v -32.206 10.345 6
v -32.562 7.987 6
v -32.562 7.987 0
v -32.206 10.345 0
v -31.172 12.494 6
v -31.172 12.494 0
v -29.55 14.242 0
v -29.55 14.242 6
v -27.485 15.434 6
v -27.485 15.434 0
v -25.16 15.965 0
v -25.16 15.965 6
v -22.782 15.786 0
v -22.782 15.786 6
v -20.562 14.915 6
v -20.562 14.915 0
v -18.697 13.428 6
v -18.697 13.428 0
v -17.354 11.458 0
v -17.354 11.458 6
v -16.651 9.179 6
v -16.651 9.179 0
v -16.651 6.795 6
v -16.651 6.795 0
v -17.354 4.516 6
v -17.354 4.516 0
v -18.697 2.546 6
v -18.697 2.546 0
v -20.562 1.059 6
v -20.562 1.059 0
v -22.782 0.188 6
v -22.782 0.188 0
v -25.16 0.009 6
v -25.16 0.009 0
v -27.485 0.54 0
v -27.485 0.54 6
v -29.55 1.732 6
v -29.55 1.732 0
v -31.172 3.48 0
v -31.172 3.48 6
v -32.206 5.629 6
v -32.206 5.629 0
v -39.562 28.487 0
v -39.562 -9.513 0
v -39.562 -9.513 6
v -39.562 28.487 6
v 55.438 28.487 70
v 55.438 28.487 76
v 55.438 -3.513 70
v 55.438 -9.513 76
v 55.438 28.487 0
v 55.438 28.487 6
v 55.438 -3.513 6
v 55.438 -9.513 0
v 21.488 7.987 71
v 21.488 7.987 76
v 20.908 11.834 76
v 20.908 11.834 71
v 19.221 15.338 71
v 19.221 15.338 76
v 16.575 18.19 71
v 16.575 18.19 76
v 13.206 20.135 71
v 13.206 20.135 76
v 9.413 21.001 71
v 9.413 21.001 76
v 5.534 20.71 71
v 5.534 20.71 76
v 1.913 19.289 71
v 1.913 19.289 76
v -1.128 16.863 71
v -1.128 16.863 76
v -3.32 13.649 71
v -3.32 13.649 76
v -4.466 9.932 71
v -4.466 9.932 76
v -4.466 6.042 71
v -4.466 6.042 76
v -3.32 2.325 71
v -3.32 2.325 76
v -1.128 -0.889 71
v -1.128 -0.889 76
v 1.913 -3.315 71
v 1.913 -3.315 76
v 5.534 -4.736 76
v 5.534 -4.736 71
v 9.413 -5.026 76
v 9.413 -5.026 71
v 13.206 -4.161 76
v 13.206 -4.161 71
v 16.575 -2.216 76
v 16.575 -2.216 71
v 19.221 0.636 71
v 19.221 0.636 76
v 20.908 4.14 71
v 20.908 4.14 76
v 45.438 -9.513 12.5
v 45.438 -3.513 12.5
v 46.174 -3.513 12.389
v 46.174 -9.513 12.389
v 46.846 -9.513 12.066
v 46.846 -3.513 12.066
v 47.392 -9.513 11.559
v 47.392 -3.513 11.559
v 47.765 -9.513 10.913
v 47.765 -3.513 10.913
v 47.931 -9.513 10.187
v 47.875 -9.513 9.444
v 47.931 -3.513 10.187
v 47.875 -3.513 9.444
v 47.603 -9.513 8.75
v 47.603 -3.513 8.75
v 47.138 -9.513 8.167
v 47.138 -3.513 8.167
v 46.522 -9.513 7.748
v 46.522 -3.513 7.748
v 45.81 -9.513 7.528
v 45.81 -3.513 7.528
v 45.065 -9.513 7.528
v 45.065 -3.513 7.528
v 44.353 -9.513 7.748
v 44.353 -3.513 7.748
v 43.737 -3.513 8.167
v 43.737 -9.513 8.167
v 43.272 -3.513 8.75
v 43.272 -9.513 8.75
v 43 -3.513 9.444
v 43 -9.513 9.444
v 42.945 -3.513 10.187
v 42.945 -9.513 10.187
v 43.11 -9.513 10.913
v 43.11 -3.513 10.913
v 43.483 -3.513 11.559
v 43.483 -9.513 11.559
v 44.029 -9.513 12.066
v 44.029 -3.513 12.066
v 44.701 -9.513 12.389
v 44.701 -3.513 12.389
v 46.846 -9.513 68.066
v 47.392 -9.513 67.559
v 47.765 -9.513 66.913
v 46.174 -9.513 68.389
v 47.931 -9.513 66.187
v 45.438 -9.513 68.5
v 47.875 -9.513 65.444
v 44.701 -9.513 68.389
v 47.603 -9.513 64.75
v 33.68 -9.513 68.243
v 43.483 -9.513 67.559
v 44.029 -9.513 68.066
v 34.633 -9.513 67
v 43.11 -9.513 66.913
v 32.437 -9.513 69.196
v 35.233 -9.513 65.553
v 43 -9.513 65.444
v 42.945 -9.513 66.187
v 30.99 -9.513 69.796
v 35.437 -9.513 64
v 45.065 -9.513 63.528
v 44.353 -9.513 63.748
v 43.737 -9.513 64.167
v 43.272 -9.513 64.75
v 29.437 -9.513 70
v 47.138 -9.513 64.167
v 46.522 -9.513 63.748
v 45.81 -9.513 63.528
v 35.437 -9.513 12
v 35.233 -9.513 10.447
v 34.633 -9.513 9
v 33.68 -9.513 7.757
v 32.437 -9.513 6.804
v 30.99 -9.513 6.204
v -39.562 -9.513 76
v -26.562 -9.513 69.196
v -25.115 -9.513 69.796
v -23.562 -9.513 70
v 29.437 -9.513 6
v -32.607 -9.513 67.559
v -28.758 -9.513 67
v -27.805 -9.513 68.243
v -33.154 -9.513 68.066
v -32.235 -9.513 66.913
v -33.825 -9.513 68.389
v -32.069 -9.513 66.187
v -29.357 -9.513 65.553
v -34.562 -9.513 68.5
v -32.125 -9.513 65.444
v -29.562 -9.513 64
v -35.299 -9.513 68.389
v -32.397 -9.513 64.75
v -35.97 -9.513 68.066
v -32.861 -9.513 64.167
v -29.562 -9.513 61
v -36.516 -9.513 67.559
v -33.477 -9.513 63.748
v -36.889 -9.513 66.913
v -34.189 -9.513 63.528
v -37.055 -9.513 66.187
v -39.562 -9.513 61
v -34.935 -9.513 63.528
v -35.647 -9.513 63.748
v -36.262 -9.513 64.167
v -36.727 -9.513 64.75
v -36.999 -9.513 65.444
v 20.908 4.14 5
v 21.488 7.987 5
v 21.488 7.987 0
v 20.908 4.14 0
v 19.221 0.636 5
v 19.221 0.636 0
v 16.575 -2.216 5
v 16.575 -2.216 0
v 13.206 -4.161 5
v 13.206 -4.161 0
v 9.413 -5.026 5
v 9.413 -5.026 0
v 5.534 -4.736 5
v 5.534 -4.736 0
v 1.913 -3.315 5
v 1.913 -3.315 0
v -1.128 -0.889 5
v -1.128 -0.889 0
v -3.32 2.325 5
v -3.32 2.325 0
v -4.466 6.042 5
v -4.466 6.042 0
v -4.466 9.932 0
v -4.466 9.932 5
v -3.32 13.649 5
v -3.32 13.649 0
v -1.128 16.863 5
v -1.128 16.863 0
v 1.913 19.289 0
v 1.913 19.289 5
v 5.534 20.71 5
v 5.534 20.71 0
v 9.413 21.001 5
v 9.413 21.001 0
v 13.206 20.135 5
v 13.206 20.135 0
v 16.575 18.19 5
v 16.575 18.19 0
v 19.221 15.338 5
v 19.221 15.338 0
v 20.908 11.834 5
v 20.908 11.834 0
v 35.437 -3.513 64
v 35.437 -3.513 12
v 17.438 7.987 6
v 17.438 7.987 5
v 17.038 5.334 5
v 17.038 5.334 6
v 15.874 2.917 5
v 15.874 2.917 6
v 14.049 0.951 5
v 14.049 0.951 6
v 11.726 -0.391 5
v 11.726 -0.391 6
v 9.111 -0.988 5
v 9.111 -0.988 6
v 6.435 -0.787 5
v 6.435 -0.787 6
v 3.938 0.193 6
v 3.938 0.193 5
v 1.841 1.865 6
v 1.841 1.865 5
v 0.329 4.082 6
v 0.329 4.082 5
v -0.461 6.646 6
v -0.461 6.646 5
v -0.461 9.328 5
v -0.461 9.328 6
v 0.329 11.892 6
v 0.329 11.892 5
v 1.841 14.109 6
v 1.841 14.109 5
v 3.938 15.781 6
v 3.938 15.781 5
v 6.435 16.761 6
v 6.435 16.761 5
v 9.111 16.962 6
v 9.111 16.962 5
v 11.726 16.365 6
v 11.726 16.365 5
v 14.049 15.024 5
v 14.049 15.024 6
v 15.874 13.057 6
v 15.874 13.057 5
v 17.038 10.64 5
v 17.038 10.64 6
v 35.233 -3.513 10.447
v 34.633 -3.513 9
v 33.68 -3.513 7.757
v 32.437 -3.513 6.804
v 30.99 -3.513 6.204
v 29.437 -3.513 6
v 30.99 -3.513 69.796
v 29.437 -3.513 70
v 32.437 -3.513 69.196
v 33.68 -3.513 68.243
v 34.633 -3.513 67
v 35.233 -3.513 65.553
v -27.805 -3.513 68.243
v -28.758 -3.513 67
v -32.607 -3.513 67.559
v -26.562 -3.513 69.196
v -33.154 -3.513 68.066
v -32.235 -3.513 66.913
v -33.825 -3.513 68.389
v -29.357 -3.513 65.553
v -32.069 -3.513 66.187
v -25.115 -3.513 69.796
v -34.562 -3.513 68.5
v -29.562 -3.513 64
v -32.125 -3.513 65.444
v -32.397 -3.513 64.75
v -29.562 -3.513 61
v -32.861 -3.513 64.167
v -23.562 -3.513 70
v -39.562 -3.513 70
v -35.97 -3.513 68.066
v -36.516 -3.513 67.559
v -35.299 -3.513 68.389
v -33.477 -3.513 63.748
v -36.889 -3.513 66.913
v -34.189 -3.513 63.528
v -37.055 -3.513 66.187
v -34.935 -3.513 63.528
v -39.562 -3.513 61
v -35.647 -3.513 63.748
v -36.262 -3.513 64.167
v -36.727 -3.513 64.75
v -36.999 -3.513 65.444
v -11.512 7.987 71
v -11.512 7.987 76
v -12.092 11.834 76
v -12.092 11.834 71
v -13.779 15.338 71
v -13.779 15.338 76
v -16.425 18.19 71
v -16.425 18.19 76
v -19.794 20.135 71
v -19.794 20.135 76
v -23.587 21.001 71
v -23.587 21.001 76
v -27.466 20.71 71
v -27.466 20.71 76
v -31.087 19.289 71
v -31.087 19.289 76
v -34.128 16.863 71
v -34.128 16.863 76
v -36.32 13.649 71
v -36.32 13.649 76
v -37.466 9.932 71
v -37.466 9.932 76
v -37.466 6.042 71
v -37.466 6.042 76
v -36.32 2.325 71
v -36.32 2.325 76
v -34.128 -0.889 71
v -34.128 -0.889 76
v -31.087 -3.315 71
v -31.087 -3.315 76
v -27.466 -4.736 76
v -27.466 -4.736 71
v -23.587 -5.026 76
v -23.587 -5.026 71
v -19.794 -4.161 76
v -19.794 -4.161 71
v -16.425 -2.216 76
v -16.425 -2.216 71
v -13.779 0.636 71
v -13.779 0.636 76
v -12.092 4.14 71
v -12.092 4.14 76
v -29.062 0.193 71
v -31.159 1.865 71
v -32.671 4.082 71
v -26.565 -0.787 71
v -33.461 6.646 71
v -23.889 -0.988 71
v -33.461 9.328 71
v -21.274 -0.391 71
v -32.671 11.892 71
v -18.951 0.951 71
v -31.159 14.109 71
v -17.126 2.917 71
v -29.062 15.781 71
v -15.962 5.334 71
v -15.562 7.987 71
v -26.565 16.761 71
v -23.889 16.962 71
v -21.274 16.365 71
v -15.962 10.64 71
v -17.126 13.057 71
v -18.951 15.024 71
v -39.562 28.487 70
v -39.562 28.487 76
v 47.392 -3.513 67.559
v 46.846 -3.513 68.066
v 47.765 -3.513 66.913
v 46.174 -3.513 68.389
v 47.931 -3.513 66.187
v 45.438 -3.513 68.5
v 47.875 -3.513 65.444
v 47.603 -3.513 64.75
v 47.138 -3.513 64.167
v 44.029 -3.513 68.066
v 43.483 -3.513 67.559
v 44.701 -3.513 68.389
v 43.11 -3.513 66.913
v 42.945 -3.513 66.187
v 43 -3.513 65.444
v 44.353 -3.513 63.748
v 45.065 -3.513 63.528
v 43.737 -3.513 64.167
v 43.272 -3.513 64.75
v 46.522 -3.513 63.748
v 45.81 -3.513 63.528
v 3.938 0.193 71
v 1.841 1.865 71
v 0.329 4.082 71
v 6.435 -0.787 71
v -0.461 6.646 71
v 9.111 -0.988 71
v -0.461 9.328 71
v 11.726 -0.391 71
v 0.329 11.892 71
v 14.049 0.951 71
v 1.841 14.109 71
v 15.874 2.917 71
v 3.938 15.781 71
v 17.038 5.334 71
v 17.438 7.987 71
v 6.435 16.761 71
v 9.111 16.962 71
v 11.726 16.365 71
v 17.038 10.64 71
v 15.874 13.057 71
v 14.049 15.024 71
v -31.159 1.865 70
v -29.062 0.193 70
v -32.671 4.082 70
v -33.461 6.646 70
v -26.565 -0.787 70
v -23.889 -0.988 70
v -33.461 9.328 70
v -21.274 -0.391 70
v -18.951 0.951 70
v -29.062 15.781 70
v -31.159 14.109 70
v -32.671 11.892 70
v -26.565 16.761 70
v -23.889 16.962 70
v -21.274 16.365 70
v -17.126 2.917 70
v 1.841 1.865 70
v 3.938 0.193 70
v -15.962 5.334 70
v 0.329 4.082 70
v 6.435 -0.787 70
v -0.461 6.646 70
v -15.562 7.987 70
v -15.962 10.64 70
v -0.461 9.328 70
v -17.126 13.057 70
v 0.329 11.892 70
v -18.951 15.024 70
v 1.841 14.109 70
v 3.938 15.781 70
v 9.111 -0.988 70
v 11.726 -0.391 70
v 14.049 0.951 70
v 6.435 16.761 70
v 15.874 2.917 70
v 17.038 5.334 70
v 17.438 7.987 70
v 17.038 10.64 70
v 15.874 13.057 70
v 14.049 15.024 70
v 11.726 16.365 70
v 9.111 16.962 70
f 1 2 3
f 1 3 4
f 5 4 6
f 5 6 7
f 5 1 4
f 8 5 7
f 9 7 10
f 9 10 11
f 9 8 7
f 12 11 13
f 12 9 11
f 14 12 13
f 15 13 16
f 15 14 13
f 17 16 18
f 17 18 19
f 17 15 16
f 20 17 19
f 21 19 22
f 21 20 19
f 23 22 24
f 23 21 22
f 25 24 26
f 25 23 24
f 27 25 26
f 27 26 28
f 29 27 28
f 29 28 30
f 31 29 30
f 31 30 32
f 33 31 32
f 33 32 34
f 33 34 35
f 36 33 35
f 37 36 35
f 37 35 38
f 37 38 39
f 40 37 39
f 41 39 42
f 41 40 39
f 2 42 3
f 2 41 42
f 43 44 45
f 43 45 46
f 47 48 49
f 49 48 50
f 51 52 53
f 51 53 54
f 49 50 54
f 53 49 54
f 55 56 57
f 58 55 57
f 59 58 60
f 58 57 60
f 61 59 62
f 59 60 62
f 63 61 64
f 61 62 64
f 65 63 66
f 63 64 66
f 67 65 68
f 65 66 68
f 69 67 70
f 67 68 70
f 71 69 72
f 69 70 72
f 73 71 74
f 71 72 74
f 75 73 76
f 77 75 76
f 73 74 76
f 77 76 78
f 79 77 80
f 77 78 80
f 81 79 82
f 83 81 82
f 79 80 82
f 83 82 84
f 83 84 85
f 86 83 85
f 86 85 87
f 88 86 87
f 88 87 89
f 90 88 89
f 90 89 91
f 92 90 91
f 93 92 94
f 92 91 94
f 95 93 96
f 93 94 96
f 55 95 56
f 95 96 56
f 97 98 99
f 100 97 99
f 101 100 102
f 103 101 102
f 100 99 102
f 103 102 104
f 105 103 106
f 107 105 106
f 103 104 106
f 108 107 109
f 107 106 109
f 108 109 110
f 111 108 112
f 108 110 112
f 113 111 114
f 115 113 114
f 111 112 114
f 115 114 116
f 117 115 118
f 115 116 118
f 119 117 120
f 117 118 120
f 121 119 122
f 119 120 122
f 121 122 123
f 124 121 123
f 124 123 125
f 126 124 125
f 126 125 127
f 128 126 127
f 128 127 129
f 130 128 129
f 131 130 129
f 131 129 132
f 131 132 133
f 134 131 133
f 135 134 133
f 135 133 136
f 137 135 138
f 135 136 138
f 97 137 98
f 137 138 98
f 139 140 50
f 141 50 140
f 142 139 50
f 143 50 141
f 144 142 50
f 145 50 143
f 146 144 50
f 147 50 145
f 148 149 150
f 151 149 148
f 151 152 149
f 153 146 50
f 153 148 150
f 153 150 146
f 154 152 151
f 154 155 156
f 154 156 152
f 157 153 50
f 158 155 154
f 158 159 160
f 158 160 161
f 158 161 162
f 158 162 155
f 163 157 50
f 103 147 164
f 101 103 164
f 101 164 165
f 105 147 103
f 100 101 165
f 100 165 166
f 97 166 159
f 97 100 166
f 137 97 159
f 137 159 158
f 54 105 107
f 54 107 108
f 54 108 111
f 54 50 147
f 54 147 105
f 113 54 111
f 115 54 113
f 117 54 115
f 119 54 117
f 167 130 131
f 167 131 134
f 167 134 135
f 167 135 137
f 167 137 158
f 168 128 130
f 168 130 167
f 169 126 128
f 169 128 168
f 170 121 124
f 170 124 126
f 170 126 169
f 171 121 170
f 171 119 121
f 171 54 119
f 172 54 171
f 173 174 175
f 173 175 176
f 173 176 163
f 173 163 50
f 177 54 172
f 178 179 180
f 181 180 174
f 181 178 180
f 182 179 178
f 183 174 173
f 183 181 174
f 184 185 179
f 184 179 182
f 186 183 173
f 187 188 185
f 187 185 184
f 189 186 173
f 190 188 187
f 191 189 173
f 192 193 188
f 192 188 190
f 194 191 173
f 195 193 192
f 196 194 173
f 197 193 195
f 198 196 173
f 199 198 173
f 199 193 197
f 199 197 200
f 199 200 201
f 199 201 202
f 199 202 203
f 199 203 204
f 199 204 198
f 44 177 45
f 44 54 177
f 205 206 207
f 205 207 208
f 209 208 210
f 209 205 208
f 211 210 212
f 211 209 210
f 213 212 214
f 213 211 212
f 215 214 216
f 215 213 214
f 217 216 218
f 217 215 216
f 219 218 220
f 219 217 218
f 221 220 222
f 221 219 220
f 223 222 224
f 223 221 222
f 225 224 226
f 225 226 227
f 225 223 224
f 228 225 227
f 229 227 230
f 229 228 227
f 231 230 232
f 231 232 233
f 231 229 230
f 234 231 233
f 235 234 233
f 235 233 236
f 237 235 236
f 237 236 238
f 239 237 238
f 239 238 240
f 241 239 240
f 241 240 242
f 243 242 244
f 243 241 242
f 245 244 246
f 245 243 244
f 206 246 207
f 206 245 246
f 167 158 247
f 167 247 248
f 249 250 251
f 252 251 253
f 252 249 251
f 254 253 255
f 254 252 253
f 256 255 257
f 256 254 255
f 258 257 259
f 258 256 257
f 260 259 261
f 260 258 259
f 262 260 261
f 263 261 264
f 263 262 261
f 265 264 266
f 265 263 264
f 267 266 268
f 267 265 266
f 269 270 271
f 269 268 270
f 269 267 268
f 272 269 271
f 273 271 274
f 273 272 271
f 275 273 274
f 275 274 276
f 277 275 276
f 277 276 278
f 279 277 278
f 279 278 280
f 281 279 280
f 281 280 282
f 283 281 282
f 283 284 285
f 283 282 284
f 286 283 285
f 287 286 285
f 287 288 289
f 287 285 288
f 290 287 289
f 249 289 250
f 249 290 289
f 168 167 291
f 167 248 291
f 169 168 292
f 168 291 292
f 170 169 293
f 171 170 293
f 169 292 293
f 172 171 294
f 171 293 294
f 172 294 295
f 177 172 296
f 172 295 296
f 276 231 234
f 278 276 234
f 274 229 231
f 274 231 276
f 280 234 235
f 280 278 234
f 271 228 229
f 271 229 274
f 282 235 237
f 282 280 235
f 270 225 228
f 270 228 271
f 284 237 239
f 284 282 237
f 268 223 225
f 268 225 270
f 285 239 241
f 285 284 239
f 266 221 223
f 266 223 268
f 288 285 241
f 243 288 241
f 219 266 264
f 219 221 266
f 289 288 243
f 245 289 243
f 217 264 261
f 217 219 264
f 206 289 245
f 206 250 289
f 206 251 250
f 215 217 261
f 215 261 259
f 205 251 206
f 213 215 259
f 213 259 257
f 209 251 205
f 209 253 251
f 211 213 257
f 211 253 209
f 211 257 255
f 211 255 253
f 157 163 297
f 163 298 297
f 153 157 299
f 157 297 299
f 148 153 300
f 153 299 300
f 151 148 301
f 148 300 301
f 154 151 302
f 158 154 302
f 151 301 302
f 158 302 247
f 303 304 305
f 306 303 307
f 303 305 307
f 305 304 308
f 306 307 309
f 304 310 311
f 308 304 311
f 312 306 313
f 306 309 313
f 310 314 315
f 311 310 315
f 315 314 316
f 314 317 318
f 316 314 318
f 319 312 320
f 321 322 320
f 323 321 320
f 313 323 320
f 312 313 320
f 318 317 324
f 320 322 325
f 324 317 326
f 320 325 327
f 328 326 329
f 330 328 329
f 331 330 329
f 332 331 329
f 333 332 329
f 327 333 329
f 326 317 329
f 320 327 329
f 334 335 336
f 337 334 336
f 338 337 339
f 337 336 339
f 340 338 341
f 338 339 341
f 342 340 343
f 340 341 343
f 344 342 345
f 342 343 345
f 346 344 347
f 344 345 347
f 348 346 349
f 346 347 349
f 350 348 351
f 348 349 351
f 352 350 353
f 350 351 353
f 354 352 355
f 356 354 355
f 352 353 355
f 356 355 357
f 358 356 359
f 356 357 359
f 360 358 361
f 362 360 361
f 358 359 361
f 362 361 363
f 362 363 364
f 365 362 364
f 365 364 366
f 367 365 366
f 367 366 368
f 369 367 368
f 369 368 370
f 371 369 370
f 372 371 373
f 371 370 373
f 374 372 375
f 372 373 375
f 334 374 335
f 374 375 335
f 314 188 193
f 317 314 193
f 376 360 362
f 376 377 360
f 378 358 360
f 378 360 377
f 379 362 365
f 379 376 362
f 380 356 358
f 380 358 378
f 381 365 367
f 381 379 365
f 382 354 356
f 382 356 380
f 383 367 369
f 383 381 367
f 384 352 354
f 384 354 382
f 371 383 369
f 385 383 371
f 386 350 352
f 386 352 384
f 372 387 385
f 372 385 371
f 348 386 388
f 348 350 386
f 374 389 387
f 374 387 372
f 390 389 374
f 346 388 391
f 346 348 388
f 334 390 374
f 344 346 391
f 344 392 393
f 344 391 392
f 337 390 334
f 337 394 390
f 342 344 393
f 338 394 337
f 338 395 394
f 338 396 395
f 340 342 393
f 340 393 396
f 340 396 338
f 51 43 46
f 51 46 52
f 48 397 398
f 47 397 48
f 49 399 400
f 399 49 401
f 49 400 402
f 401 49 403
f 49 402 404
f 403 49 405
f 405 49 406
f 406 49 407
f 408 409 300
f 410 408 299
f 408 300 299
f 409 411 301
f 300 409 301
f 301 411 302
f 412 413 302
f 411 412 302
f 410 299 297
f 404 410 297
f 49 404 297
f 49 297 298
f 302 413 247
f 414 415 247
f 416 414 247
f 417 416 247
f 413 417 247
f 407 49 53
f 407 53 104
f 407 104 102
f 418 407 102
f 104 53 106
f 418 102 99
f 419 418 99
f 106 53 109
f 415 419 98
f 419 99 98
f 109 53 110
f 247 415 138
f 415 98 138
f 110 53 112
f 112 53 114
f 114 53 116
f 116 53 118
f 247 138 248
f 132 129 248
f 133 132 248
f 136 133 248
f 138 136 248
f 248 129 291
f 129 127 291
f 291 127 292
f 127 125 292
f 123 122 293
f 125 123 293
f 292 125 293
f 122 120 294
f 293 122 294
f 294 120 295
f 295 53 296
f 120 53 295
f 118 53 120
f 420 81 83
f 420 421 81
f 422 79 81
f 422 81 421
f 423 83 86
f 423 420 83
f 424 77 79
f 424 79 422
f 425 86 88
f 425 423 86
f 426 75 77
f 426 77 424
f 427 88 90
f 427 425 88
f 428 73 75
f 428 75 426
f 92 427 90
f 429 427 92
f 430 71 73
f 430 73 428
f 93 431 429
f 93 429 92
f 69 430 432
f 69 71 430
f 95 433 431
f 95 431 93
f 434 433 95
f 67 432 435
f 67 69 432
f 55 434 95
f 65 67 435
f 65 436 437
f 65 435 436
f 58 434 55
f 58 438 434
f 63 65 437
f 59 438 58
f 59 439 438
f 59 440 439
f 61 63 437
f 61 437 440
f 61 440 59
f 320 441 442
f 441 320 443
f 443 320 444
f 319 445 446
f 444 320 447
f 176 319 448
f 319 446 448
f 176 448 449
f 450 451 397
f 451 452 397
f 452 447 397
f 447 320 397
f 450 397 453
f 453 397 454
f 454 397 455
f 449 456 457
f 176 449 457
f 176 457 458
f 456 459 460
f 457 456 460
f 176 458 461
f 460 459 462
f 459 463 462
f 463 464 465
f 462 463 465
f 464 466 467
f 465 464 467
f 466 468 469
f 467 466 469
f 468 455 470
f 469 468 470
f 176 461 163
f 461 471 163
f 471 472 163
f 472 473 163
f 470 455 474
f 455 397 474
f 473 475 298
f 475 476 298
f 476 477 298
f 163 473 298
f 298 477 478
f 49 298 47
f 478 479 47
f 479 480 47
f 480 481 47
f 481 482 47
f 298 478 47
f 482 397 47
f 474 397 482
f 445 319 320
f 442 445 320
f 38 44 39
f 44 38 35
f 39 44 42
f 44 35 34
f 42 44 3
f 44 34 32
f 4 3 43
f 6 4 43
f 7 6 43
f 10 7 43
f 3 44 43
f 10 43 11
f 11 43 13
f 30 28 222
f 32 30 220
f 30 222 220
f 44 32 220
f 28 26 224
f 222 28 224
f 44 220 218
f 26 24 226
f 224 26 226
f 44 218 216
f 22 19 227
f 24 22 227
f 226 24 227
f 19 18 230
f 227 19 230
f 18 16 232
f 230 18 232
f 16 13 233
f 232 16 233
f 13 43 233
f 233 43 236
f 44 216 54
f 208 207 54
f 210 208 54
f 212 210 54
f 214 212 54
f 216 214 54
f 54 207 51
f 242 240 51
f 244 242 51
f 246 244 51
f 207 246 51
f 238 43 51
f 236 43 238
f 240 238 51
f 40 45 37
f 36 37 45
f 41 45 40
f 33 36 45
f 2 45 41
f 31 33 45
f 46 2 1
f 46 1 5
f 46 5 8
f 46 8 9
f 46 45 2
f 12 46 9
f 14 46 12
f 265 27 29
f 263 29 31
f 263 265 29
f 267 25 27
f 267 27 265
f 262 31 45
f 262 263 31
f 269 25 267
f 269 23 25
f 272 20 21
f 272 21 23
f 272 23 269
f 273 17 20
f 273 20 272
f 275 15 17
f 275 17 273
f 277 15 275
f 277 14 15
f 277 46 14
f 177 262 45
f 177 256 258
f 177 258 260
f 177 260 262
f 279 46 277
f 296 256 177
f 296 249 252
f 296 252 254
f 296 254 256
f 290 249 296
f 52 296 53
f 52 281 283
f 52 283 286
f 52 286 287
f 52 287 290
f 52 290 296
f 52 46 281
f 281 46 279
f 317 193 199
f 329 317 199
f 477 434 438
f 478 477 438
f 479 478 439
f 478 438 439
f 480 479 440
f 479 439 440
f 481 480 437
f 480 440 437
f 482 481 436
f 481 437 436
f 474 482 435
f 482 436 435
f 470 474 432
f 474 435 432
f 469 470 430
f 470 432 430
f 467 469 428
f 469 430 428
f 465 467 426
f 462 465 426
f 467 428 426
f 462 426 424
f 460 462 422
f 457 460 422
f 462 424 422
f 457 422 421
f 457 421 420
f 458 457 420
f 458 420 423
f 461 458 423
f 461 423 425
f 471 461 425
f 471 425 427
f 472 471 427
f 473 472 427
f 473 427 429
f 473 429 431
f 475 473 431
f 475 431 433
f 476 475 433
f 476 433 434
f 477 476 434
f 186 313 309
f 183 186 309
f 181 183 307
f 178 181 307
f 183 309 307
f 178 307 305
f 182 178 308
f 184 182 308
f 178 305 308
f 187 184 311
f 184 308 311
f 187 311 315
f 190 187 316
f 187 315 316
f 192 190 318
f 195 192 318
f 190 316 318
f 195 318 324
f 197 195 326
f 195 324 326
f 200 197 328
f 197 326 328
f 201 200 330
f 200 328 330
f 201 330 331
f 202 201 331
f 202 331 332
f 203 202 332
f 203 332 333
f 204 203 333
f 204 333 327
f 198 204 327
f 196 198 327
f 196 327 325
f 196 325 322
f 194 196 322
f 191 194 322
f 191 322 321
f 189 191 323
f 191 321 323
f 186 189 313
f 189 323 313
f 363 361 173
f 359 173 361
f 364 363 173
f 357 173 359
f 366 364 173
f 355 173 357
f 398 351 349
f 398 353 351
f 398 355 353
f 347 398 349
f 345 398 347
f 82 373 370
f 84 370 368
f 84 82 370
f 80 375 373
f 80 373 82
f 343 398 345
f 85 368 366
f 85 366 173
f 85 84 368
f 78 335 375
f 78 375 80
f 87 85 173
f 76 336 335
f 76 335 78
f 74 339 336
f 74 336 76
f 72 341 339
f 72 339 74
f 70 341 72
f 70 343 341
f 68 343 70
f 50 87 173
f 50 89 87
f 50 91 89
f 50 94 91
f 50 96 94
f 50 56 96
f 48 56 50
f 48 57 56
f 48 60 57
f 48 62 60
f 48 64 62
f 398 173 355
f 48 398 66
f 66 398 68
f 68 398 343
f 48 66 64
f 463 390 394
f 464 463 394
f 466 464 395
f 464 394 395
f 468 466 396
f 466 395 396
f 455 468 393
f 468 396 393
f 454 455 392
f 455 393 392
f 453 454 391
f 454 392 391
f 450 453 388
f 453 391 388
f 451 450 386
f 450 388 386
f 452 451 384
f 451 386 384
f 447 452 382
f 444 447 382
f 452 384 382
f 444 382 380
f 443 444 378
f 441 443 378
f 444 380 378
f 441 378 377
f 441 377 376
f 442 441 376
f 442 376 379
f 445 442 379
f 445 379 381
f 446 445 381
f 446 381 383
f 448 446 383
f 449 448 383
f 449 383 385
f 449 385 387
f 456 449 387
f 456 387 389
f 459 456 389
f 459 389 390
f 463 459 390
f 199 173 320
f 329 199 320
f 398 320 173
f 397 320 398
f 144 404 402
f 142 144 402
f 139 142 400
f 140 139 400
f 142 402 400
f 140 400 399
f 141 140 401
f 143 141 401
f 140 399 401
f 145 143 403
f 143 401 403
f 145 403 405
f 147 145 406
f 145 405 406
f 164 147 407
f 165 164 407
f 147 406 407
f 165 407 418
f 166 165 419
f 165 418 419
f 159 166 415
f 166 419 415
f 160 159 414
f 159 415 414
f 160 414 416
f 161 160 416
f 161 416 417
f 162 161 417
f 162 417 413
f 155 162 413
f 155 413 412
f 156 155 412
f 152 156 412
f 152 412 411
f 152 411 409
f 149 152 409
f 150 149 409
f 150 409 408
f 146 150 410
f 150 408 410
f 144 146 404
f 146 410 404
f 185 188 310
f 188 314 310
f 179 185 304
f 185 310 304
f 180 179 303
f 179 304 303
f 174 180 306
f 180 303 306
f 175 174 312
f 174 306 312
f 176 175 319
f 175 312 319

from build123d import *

# Parameters (mm, degrees)
SKETCH1_W           = 95
SKETCH1_H           = 38
BOSS_EXTRUDE1_DEPTH = 6
SKETCH2_W           = 95
SKETCH2_H           = 38
BOSS_EXTRUDE2_DEPTH = 6
SKETCH11_W          = 20.001105266
SKETCH11_H          = 64
BOSS_EXTRUDE5_DEPTH = 6
SKETCH13_W          = 10
SKETCH13_H          = 9
BOSS_EXTRUDE7_DEPTH = 6
SKETCH16_R          = 9
CUT_EXTRUDE2_DEPTH  = 6
SKETCH20_R          = 13.05
CUT_EXTRUDE3_DEPTH  = 5
CUT_EXTRUDE4_START  = -6
SKETCH21_R          = 8
SKETCH21_R_2        = 9
CUT_EXTRUDE4_DEPTH  = 6
CUT_EXTRUDE5_START  = -5
SKETCH22_R          = 13.05
CUT_EXTRUDE5_DEPTH  = 5
SKETCH25_R          = 2.5
CUT_EXTRUDE6_DEPTH  = 6
FILLET2_R           = 6


with BuildPart() as part:
    # Sketch1 → Boss-Extrude1 (new body)
    with BuildSketch(Plane.XY):
        with Locations((7.938087136, 9.487020953)):
            Rectangle(SKETCH1_W, SKETCH1_H)
    extrude(amount=BOSS_EXTRUDE1_DEPTH)



with BuildPart() as body_2:
    # Sketch2 → Boss-Extrude2 (new body)
    with BuildSketch(Plane.XY.offset(70)):
        with Locations((7.938087136, 9.487020953)):
            Rectangle(SKETCH2_W, SKETCH2_H)
    extrude(amount=BOSS_EXTRUDE2_DEPTH)


with BuildPart() as part_1:
    add(part.part)

    add(body_2.part)  # Boss-Extrude5 merges body 2
    # Sketch11 → Boss-Extrude5 (add)
    with BuildSketch(Plane(origin=(0, -9.512979047, 0), x_dir=(-1, 0, 0), z_dir=(0, -1, 0))):
        with Locations((-45.437534503, -38)):
            Rectangle(SKETCH11_W, SKETCH11_H)
    extrude(amount=-BOSS_EXTRUDE5_DEPTH)

    # Sketch13 → Boss-Extrude7 (add)
    with BuildSketch(Plane(origin=(0, -9.512979047, 0), x_dir=(-1, 0, 0), z_dir=(0, -1, 0))):
        with Locations((34.561912864, -65.5)):
            Rectangle(SKETCH13_W, SKETCH13_H)
    extrude(amount=-BOSS_EXTRUDE7_DEPTH)

    # Sketch16 → Cut-Extrude2 (cut)
    with BuildSketch(Plane.XY.offset(76)):
        with Locations((-24.561912864, 7.987020953)):
            Circle(SKETCH16_R)
        with Locations((8.438087136, 7.987020953)):
            Circle(SKETCH16_R)
    extrude(amount=-CUT_EXTRUDE2_DEPTH, mode=Mode.SUBTRACT)

    # Sketch20 → Cut-Extrude3 (cut)
    with BuildSketch(Plane.XY.offset(76)):
        with Locations((-24.561912864, 7.987020953)):
            Circle(SKETCH20_R)
        with Locations((8.438087136, 7.987020953)):
            Circle(SKETCH20_R)
    extrude(amount=-CUT_EXTRUDE3_DEPTH, mode=Mode.SUBTRACT)

    # Sketch21 → Cut-Extrude4 (cut)
    with BuildSketch(Plane(origin=(0, 0, 0), x_dir=(-1, 0, 0), z_dir=(0, 0, -1)).offset(CUT_EXTRUDE4_START)):
        with Locations((24.561912864, 7.987020953)):
            Circle(SKETCH21_R)
        with Locations(Location((-8.438087136, 7.987020953, 0), (0, 0, 180))):
            Circle(SKETCH21_R_2)
    extrude(amount=CUT_EXTRUDE4_DEPTH, mode=Mode.SUBTRACT)

    # Sketch22 → Cut-Extrude5 (cut)
    with BuildSketch(Plane(origin=(0, 0, 0), x_dir=(-1, 0, 0), z_dir=(0, 0, -1)).offset(CUT_EXTRUDE5_START)):
        with Locations(Location((-8.438087136, 7.987020953, 0), (0, 0, 180))):
            Circle(SKETCH22_R)
    extrude(amount=CUT_EXTRUDE5_DEPTH, mode=Mode.SUBTRACT)

    # Sketch25 → Cut-Extrude6 (cut)
    with BuildSketch(Plane(origin=(0, -3.512979047, 0), x_dir=(1, 0, 0), z_dir=(0, 1, 0))):
        with Locations(Location((45.437534503, -10, 0), (0, 0, 270))):
            Circle(SKETCH25_R)
        with Locations(Location((45.437534503, -66, 0), (0, 0, 270))):
            Circle(SKETCH25_R)
        with Locations(Location((-34.561912864, -66, 0), (0, 0, 270))):
            Circle(SKETCH25_R)
    extrude(amount=-CUT_EXTRUDE6_DEPTH, mode=Mode.SUBTRACT)

    # Fillet2
    fillet2_edges = [part_1.edges().sort_by_distance(p)[0] for p in [
        (35.43698187, -6.512979047, 6),
        (35.43698187, -6.512979047, 70),
        (-29.561912864, -6.512979047, 70),
    ]]
    fillet(fillet2_edges, radius=FILLET2_R)


solid = part_1.part
